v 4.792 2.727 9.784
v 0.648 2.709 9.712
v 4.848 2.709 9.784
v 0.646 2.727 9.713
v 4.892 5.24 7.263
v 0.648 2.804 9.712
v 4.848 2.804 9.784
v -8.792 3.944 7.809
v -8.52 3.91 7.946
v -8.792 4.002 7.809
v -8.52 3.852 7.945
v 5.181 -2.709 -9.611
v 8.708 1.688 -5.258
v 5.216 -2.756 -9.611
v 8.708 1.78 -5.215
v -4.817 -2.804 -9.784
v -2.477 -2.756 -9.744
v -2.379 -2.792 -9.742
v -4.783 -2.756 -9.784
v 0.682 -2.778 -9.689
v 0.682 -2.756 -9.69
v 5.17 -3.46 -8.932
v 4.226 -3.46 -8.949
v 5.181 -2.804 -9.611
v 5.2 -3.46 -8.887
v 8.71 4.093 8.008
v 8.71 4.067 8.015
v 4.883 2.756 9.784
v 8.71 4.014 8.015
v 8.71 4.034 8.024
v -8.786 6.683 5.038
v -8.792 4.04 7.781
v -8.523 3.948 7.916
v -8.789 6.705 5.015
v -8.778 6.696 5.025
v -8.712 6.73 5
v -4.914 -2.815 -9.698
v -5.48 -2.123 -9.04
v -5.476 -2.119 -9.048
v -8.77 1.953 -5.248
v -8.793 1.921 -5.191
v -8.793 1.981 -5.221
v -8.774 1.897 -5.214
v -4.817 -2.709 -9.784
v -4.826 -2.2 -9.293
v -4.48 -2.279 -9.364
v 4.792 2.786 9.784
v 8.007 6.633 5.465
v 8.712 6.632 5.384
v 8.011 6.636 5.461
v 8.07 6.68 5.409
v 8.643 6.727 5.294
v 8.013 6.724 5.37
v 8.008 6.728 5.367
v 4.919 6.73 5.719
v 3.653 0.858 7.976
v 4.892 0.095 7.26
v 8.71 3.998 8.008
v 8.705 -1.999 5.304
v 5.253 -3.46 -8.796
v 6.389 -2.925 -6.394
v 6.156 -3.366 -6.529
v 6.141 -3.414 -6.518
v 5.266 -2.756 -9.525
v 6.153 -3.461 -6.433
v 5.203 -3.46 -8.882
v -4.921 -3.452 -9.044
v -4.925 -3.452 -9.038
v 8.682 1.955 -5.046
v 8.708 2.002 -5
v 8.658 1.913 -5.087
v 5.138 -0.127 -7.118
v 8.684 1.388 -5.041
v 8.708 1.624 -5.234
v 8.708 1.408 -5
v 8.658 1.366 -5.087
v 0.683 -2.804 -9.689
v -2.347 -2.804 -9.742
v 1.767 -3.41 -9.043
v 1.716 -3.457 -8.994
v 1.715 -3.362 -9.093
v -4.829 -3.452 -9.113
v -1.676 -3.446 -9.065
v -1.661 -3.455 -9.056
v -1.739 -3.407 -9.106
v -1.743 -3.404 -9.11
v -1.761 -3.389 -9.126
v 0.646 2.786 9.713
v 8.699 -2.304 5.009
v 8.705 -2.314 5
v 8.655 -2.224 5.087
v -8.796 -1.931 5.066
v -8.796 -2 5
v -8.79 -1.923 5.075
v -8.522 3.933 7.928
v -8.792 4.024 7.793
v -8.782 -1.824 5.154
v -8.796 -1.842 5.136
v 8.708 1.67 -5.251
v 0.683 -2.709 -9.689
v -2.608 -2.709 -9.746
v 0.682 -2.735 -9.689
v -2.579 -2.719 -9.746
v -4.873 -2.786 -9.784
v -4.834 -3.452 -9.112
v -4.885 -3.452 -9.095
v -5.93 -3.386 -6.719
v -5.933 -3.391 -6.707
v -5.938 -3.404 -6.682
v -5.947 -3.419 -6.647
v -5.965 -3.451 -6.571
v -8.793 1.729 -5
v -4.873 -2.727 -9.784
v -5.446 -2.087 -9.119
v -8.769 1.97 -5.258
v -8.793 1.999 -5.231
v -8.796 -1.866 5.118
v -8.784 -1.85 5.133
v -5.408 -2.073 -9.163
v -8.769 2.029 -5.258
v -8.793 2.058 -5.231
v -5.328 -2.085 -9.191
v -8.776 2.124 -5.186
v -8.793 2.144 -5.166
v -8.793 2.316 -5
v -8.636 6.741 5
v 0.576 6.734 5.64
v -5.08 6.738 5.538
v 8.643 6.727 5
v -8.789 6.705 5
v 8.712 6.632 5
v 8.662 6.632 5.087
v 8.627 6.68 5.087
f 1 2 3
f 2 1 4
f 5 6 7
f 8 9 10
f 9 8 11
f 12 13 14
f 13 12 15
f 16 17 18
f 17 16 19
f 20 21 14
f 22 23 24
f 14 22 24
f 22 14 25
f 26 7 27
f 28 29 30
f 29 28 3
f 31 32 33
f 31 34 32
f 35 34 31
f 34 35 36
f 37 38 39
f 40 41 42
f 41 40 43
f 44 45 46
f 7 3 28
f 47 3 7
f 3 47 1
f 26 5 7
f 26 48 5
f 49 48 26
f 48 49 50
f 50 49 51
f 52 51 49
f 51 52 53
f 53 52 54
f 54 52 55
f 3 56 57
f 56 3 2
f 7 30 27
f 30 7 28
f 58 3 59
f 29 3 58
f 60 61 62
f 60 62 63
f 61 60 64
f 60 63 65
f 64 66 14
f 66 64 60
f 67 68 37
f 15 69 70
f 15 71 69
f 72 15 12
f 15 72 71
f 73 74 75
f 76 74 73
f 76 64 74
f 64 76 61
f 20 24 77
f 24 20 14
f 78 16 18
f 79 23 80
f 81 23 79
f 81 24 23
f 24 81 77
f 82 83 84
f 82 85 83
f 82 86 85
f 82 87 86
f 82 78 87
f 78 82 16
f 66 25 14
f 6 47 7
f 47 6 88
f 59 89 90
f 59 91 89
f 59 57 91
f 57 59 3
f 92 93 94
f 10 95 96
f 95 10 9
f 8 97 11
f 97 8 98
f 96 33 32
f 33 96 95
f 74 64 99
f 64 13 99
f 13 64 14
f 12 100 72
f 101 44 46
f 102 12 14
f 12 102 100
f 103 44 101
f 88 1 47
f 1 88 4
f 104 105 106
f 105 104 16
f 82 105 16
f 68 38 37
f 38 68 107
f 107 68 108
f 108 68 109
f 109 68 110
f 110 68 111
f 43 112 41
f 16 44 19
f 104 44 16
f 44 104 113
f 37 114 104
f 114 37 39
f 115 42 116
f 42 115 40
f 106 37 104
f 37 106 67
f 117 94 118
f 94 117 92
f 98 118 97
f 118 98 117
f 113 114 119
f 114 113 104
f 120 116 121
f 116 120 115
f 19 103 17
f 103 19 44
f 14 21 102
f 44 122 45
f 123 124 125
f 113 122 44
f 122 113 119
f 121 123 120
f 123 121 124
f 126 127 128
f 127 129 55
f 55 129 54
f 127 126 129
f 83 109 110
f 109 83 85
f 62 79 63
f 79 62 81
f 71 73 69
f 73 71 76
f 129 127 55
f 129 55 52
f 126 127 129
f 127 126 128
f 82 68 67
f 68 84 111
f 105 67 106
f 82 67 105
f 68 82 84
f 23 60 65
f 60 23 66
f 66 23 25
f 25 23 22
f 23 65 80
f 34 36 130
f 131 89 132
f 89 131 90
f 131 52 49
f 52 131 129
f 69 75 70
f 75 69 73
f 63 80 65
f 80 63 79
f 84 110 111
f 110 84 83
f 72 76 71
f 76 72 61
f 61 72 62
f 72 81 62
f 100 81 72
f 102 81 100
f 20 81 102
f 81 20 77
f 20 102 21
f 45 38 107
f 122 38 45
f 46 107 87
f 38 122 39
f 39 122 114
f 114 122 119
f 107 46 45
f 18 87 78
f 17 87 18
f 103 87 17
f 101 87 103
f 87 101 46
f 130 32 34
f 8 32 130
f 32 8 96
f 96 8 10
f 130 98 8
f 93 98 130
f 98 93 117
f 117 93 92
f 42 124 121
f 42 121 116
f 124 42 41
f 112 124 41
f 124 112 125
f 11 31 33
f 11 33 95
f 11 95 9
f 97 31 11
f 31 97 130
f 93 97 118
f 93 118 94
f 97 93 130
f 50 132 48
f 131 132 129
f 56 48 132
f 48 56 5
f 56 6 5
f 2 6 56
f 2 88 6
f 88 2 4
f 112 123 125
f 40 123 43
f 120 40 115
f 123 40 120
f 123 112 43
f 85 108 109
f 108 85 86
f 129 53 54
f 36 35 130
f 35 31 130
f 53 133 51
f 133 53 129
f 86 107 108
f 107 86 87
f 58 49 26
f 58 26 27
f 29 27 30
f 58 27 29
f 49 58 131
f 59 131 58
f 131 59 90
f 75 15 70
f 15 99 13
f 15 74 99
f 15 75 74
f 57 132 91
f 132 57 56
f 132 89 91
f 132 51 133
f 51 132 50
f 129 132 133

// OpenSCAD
// Auto-generated OpenSCAD file

    inner_points = 10*[[-0.0056399232151652795, -0.3360917085536317, -0.9999999999999865], [-0.004821322839871758, 0.663907956393025, -1.0000000000000135], [-0.005639923215391682, -0.3360917085535774, 1.0000000000000135], [-0.004821322840098161, 0.6639079563930792, 0.9999999999999865], [-0.8716650368349537, -0.3353827798330664, -0.5000000000000846], [0.8603851904045097, -0.33680063727416976, -0.4999999999998884], [-0.8708464364596602, 0.6646168851135902, -0.5000000000001116], [0.8612037907798034, 0.6631990276724868, -0.49999999999991546], [-0.8716650368350669, -0.3353827798330393, 0.49999999999991546], [0.8603851904043966, -0.33680063727414267, 0.5000000000001116], [-0.8708464364597732, 0.6646168851136173, 0.4999999999998884], [0.8612037907796903, 0.6631990276725139, 0.5000000000000846], [-0.7917964519713716, 0.1645520072181886, -1.3623724356958835], [-0.7917964519716802, 0.16455200721826255, 1.3623724356957054]];

    outer_points = 10*[[-1.0060843799292358, -0.34733073917718565, 0.3422799703240538], [-0.9936151164744732, 0.34733073917718565, -0.3769487470944146], [0.9936151164744732, -0.34733073917718565, 0.3769487470944146], [1.0060843799292358, 0.34733073917718565, -0.3422799703240538], [-0.5165877783212961, 0.27563320269095287, 0.9524512611485145], [-0.49573123333532093, -0.9702946810453241, -0.2505569321152264], [-0.5041185148665335, 0.9702946810453241, 0.233222543730046], [-0.4832619698805584, -0.27563320269095287, -0.969785649533695], [0.4832619698805584, 0.27563320269095287, 0.969785649533695], [0.5041185148665335, -0.9702946810453241, -0.233222543730046], [0.49573123333532093, 0.9702946810453241, 0.2505569321152264], [0.5165877783212961, -0.27563320269095287, -0.9524512611485145], [-1.3716391974518345, 0.5658059352223662, 0.5226991745472914], [1.35269627612334, 0.5658059352223662, 0.5699309603985218]];

    // Convex hull for inner set (I)
    module inner_hull() {
        hull() {
            for (p = inner_points) {
                translate(p) sphere(r=0.1);
            }
        }
    }

    // Convex hull for outer set (O) minus inner hull (O \ I)
    module outer_minus_inner() {
        difference() {
            hull() {
                for (p = outer_points) {
                    translate(p) sphere(r=0.1);
                }
            }
            inner_hull(); // Subtract inner hull
        }
    }

    // Convex hull for outer set (O) minus all translated inner hulls
    module outer_minus_AllTranslationInner() {
        difference() {
            hull() {
                for (p = outer_points) {
                    translate(p) sphere(r=0.1);
                }
            }
            hull() {
                translate([0,0,50]) inner_hull();
                translate([0,0,-50]) inner_hull();
            }; // Subtract translated inner hulls
        }
    }

    // Difference between outer_minus_inner and outer_minus_AllTranslationInner
    module outer_minus_inner_diff() {
        difference() {
            // Outer minus inner
            difference() {
                hull() {
                    for (p = outer_points) {
                        translate(p) sphere(r=0.1);
                    }
                }
                inner_hull();
            }

            // Subtract Outer minus AllTranslationInner
            difference() {
                hull() {
                    for (p = outer_points) {
                        translate(p) sphere(r=0.1);
                    }
                }
                hull() {
                    translate([0,0,50]) inner_hull();
                    translate([0,0,-50]) inner_hull();
                };
            }
        }
    }

    // Rendering all with colors applied
    color([1, 1, 0, 1]) outer_minus_inner_diff(); // Opaque yellow
    
